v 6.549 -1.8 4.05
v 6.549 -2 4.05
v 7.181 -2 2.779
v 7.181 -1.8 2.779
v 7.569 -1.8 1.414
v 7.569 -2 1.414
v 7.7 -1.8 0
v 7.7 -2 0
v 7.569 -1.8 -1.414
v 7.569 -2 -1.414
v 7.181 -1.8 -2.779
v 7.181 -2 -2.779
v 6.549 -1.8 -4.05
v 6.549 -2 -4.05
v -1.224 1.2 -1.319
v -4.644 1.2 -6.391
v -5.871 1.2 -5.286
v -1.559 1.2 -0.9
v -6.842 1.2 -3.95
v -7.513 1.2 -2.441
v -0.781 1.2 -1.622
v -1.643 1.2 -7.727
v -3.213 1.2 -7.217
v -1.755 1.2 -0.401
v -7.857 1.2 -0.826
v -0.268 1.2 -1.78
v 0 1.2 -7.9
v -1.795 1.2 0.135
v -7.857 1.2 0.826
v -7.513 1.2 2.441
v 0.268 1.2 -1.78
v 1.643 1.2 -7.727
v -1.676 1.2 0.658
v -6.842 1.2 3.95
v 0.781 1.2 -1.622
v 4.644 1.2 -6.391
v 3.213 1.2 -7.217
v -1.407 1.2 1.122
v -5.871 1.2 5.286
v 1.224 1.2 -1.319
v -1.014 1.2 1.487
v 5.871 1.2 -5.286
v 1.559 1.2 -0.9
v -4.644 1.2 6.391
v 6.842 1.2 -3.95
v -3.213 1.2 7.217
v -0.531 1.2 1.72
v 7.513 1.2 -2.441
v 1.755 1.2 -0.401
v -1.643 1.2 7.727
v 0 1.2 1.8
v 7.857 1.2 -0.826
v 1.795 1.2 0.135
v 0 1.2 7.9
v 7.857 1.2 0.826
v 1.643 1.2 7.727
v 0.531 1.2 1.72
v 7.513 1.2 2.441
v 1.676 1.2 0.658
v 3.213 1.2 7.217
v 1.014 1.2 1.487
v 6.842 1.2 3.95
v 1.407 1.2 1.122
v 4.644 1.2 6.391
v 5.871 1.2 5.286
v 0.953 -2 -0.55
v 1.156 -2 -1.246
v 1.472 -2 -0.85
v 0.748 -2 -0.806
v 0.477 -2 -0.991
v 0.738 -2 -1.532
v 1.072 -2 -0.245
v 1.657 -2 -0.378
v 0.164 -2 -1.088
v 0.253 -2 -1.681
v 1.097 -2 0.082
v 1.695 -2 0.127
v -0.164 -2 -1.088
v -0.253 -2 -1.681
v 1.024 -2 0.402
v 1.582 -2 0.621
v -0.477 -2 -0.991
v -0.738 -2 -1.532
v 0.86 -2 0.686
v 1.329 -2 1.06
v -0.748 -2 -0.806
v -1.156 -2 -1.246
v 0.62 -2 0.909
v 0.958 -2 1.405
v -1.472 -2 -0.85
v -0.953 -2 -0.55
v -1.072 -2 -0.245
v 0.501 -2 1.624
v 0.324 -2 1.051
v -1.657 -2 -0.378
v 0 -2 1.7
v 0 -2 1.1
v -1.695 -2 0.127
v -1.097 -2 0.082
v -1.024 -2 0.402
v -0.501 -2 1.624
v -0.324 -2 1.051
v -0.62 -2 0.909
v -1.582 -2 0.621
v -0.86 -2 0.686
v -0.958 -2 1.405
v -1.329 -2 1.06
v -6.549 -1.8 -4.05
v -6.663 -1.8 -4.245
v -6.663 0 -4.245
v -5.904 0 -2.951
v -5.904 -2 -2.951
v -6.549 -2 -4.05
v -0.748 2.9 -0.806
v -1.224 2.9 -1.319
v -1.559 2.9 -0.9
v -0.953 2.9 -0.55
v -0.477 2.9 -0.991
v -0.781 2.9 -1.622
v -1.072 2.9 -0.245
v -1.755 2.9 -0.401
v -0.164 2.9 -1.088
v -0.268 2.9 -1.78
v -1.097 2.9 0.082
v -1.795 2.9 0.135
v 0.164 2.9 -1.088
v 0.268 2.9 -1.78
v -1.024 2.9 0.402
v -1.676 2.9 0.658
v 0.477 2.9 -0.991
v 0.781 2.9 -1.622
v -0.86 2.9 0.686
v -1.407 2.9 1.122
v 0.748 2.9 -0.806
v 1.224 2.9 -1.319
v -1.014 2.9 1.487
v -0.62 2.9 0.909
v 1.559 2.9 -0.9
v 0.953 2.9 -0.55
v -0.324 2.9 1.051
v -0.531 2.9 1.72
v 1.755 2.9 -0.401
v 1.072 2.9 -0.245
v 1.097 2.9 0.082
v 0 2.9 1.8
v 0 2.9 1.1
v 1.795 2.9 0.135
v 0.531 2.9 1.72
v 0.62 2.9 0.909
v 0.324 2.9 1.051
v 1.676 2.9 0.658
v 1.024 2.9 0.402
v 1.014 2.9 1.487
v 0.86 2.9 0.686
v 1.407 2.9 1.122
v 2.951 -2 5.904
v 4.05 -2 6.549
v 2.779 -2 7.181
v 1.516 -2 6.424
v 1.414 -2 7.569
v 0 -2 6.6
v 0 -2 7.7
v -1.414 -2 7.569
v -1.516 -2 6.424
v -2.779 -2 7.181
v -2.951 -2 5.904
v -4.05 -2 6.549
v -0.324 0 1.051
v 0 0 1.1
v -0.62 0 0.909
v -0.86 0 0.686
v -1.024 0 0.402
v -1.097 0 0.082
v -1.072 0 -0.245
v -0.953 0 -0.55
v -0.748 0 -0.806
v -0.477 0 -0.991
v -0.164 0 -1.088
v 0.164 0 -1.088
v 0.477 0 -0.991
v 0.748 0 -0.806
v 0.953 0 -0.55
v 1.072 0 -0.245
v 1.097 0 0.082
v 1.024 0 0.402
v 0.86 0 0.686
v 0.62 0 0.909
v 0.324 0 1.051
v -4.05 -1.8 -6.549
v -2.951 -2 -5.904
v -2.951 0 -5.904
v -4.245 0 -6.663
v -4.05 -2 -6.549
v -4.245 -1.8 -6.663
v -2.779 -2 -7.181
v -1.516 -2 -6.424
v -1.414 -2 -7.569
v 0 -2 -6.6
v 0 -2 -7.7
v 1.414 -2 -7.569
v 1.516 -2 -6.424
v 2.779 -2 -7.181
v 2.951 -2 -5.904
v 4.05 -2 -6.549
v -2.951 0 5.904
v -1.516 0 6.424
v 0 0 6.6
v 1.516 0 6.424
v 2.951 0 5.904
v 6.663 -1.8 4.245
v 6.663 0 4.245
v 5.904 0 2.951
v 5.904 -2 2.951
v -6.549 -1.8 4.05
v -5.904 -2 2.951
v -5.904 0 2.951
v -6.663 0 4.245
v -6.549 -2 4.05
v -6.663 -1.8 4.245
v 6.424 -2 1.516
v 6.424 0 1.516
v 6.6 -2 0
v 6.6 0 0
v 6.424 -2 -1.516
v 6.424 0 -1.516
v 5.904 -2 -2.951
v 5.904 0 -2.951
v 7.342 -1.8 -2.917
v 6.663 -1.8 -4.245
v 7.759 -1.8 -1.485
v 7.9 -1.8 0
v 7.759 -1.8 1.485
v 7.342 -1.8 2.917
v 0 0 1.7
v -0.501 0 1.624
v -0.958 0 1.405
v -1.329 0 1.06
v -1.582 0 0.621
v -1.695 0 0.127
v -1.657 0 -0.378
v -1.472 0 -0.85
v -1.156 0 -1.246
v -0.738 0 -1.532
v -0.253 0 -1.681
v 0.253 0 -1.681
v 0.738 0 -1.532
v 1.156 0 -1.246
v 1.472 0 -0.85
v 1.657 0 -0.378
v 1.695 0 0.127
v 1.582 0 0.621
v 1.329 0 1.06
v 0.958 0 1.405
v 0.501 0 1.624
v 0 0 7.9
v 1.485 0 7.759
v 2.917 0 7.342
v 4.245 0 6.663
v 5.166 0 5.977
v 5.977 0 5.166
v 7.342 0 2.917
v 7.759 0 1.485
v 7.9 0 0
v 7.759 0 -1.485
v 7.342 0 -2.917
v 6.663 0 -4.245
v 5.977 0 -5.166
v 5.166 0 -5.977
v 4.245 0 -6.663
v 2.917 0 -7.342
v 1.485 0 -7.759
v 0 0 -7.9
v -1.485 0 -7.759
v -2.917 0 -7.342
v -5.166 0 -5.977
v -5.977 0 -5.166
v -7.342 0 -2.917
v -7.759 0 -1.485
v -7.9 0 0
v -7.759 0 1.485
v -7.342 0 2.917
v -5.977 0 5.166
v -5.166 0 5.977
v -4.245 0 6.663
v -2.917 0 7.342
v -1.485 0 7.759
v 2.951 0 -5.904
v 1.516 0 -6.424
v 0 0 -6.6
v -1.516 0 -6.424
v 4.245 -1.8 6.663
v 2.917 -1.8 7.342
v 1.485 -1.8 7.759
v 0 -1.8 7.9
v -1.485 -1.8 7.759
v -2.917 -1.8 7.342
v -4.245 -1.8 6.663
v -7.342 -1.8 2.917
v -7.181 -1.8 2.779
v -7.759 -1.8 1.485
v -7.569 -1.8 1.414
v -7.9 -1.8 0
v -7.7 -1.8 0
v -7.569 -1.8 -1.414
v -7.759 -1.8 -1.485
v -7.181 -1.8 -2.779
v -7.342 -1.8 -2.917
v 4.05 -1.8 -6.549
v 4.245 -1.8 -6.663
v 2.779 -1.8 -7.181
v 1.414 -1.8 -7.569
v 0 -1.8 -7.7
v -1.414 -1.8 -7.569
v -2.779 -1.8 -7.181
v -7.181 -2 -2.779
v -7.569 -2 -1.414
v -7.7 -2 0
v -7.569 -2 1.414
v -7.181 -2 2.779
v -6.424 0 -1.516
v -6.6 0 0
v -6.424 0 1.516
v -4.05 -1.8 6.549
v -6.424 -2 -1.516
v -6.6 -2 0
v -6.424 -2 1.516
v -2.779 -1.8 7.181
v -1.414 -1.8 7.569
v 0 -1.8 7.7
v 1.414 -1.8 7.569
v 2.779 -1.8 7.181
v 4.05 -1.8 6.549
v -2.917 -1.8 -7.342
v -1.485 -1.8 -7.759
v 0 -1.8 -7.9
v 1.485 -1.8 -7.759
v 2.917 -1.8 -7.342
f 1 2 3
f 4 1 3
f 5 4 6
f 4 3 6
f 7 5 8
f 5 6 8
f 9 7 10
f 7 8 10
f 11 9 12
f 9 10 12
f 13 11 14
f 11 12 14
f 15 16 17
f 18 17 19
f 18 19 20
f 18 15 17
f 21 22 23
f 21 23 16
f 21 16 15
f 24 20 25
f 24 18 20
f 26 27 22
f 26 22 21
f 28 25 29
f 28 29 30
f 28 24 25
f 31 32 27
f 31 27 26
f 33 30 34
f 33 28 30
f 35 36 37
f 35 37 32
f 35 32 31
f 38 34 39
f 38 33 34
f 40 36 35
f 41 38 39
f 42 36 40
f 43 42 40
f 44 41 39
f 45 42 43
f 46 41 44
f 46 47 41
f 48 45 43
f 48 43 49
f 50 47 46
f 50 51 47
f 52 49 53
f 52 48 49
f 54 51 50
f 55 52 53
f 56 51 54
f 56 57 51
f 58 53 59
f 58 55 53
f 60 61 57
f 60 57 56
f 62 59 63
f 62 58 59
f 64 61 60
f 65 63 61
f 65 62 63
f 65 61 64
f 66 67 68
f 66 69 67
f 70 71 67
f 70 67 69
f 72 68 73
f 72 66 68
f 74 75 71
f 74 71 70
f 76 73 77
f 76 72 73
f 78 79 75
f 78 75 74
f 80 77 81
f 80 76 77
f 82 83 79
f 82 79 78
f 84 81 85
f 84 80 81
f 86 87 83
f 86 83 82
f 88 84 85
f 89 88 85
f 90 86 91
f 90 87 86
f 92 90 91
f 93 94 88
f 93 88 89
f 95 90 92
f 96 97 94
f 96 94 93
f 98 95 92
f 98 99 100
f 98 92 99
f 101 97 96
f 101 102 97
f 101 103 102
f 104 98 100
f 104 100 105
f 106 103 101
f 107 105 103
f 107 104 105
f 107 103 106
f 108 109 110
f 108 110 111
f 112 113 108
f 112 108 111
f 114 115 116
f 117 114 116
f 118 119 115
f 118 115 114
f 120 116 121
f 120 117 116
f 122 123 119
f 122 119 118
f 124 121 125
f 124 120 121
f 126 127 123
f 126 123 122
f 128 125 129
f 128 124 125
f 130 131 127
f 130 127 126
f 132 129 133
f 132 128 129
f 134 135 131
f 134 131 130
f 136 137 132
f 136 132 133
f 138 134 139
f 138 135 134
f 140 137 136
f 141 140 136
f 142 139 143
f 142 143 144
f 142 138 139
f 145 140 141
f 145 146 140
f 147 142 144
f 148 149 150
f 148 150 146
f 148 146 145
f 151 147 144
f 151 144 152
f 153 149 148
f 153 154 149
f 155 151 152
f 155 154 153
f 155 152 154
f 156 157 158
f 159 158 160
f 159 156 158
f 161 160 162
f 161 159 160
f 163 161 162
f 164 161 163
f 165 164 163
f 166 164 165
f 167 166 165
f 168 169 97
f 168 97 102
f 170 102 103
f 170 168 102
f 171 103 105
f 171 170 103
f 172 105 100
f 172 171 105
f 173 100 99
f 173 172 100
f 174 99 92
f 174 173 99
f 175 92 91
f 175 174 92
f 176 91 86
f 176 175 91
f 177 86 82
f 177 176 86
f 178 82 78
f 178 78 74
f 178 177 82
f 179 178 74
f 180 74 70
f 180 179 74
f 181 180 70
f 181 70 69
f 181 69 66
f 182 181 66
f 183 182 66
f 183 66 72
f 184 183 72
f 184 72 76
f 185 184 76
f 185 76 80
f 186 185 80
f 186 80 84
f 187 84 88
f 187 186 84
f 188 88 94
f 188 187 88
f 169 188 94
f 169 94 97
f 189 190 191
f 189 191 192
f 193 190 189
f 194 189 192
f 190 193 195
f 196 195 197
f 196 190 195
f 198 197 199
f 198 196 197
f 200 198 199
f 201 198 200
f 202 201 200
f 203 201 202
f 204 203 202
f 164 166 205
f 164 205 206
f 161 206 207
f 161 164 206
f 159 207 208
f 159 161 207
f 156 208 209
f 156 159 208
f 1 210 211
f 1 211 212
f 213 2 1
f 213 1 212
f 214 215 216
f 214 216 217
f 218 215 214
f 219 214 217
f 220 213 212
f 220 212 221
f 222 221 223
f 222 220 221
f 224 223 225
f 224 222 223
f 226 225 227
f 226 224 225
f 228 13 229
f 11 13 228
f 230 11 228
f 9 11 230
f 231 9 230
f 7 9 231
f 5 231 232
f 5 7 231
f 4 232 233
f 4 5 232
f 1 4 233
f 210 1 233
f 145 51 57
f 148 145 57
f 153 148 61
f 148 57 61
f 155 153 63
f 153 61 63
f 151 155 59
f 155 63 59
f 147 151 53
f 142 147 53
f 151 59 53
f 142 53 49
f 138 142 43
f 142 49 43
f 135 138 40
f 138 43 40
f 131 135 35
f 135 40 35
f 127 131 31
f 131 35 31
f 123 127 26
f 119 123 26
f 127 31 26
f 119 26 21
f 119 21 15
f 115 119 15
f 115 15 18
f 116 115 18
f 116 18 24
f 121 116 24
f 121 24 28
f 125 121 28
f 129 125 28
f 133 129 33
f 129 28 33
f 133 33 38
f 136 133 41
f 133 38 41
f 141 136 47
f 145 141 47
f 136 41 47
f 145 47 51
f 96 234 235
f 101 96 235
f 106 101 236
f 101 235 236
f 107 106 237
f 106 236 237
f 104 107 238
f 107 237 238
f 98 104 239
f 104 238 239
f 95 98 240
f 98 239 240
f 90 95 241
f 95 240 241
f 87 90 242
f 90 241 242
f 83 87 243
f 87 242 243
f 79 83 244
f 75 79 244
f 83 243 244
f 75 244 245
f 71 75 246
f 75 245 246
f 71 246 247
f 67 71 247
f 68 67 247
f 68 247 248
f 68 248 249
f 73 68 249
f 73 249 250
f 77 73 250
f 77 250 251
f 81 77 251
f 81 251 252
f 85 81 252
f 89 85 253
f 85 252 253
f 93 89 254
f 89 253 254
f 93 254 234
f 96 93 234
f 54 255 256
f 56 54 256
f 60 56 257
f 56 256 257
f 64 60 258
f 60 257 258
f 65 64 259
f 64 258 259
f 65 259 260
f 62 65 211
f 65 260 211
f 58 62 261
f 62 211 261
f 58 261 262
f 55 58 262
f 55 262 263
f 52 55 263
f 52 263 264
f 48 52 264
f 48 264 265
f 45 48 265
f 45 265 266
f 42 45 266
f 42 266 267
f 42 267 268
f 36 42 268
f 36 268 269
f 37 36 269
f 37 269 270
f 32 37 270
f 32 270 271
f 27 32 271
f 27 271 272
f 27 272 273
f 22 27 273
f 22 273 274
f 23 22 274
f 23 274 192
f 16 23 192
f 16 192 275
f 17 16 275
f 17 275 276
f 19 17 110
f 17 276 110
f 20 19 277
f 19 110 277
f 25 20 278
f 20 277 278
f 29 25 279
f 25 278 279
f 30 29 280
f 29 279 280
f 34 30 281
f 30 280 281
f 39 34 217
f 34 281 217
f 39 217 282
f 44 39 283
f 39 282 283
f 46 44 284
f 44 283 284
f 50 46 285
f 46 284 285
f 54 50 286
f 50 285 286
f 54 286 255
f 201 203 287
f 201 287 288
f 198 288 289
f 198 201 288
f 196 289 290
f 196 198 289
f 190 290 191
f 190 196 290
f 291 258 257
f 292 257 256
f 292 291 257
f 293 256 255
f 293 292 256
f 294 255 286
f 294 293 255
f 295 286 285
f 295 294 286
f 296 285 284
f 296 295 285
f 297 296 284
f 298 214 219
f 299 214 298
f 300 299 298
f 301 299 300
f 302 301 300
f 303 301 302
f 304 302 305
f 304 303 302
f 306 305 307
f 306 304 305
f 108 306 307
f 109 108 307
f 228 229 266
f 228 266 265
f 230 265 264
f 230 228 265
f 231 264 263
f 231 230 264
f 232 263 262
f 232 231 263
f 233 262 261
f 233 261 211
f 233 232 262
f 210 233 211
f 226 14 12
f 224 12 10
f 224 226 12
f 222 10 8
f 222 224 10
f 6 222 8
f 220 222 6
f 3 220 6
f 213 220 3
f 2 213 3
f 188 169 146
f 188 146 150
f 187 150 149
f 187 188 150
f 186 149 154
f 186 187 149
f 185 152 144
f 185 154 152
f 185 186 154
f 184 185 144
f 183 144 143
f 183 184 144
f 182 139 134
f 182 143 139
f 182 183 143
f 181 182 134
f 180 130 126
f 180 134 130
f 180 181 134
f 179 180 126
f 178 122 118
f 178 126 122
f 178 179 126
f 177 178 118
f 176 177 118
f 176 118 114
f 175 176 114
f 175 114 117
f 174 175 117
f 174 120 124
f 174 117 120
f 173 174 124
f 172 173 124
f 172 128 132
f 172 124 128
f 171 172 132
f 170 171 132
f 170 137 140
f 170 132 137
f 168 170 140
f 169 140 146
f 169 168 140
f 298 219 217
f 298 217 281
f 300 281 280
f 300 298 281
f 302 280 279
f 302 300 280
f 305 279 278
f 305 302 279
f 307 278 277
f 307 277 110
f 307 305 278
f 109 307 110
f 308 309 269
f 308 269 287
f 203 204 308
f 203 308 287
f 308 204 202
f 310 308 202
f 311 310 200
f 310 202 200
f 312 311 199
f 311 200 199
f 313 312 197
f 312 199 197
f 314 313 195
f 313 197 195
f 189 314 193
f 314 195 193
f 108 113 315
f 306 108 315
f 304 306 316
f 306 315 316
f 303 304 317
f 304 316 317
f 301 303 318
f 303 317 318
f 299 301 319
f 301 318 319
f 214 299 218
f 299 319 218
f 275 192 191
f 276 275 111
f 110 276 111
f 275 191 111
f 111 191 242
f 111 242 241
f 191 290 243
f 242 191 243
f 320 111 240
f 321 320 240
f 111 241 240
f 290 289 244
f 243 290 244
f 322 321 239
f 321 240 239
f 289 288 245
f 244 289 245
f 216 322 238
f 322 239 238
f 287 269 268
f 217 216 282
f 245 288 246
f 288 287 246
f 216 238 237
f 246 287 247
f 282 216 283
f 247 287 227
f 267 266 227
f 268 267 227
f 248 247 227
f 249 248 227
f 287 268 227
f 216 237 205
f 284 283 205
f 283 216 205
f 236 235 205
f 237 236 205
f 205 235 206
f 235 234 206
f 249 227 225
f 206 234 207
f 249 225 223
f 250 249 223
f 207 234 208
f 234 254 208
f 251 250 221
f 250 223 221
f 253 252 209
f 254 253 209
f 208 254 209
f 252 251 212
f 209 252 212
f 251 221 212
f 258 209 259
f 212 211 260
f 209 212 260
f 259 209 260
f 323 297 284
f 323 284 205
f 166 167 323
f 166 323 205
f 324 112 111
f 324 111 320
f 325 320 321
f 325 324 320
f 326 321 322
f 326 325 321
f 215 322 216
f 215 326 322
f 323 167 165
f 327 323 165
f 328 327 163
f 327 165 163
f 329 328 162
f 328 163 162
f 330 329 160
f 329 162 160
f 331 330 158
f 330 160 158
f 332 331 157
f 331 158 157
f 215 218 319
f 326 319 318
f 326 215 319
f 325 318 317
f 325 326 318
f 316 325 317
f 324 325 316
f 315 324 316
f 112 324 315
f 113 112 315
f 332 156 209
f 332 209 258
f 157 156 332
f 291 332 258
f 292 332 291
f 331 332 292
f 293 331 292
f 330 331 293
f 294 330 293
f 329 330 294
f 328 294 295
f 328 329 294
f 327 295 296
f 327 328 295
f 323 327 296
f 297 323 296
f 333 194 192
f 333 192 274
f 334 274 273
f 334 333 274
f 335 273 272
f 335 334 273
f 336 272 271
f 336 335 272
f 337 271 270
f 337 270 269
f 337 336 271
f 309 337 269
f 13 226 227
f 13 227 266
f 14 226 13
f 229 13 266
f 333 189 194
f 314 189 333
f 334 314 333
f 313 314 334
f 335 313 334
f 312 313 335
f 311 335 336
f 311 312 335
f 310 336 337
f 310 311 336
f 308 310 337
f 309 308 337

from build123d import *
from build123d.topology import SkipClean

# Parameters (mm, degrees)
SKETCH1_R               = 7.9
BOSS_EXTRUDE1_DEPTH     = 1.2
SKETCH2_R               = 1.8
BOSS_EXTRUDE2_DEPTH     = 1.7
CUT_EXTRUDE1_DEPTH      = 12.542530052
CUT_EXTRUDE1_DEPTH_BACK = 12.542530052
SKETCH3_R               = 1.1
BOSS_EXTRUDE3_START     = 2
BOSS_EXTRUDE3_DEPTH     = 2
CUT_EXTRUDE2_DEPTH      = 0.2
CIRPATTERN1_COUNT       = 4
SKETCH6_R               = 1.7
SKETCH6_R_2             = 1.1
BOSS_EXTRUDE4_DEPTH     = 2


with BuildPart() as part:
    # Sketch1 → Boss-Extrude1 (new body)
    with BuildSketch(Plane(origin=(0, 0, 0), x_dir=(1, 0, 0), z_dir=(0, 1, 0))):
        with Locations(Location((0, 0, 0), (0, 0, 270))):
            Circle(SKETCH1_R)
    extrude(amount=BOSS_EXTRUDE1_DEPTH)

    # Sketch2 → Boss-Extrude2 (add)
    with BuildSketch(Plane(origin=(0, 1.2, 0), x_dir=(1, 0, 0), z_dir=(0, 1, 0))):
        with Locations(Location((0, 0, 0), (0, 0, 270))):
            Circle(SKETCH2_R)
    extrude(amount=BOSS_EXTRUDE2_DEPTH)

    # Sketch3 → Cut-Extrude1 (cut, two sides: drawn at the far end of the back side and taken through both)
    with BuildSketch(Plane(origin=(0, 2.9, 0), x_dir=(1, 0, 0), z_dir=(0, 1, 0)).offset(-CUT_EXTRUDE1_DEPTH_BACK)):
        with Locations(Location((0, 0, 0), (0, 0, 270))):
            Circle(SKETCH3_R)
    extrude(amount=CUT_EXTRUDE1_DEPTH + CUT_EXTRUDE1_DEPTH_BACK, mode=Mode.SUBTRACT)

    # Sketch4 → Boss-Extrude3 (add)
    with SkipClean():  # the faces are left unmerged after this step: merging them gives an invalid solid
        with BuildSketch(Plane.XZ.offset(BOSS_EXTRUDE3_START)):
            with BuildLine():
                Line((4.244666906, -6.662792422), (2.951034003, -5.903507289))
                ThreePointArc((2.951034003, -5.903507289), (0, -6.6), (-2.951034003, -5.903507289))
                Line((-2.951034003, -5.903507289), (-4.244666906, -6.662792422))
                ThreePointArc((-4.244666906, -6.662792422), (0, -7.9), (4.244666906, -6.662792422))
            make_face()
        boss_extrude3 = extrude(amount=-BOSS_EXTRUDE3_DEPTH)

    # Sketch5 → Cut-Extrude2 (cut)
    with SkipClean():  # the faces are left unmerged after this step: merging them gives an invalid solid
        with BuildSketch(Plane.XZ.offset(2)):
            with BuildLine():
                Line((-4.050265696, -6.54869054), (-4.244666906, -6.662792422))
                ThreePointArc((-4.244666906, -6.662792422), (0, -7.9), (4.244666906, -6.662792422))
                Line((4.244666906, -6.662792422), (4.050265696, -6.54869054))
                ThreePointArc((4.050265696, -6.54869054), (0, -7.7), (-4.050265696, -6.54869054))
            make_face()
        cut_extrude2 = extrude(amount=-CUT_EXTRUDE2_DEPTH, mode=Mode.SUBTRACT)

    # CirPattern1: Boss-Extrude3, Cut-Extrude2 ×4 about axis
    with SkipClean():  # the faces are left unmerged after this step: merging them gives an invalid solid
        cirpattern1_axis = Axis((0, 0, 0), (0, 1, 0))
        add([boss_extrude3.rotate(cirpattern1_axis, i * 360 / CIRPATTERN1_COUNT) for i in range(1, CIRPATTERN1_COUNT)])
        add([cut_extrude2.rotate(cirpattern1_axis, i * 360 / CIRPATTERN1_COUNT) for i in range(1, CIRPATTERN1_COUNT)], mode=Mode.SUBTRACT)

    # Sketch6 → Boss-Extrude4 (add)
    with SkipClean():  # the faces are left unmerged after this step: merging them gives an invalid solid
        with BuildSketch(Plane.XZ):
            with Locations(Location((0, 0, 0), (0, 0, 90))):
                Circle(SKETCH6_R)
            with Locations(Location((0, 0, 0), (0, 0, 90))):
                Circle(SKETCH6_R_2, mode=Mode.SUBTRACT)
        extrude(amount=BOSS_EXTRUDE4_DEPTH)


solid = part.part
